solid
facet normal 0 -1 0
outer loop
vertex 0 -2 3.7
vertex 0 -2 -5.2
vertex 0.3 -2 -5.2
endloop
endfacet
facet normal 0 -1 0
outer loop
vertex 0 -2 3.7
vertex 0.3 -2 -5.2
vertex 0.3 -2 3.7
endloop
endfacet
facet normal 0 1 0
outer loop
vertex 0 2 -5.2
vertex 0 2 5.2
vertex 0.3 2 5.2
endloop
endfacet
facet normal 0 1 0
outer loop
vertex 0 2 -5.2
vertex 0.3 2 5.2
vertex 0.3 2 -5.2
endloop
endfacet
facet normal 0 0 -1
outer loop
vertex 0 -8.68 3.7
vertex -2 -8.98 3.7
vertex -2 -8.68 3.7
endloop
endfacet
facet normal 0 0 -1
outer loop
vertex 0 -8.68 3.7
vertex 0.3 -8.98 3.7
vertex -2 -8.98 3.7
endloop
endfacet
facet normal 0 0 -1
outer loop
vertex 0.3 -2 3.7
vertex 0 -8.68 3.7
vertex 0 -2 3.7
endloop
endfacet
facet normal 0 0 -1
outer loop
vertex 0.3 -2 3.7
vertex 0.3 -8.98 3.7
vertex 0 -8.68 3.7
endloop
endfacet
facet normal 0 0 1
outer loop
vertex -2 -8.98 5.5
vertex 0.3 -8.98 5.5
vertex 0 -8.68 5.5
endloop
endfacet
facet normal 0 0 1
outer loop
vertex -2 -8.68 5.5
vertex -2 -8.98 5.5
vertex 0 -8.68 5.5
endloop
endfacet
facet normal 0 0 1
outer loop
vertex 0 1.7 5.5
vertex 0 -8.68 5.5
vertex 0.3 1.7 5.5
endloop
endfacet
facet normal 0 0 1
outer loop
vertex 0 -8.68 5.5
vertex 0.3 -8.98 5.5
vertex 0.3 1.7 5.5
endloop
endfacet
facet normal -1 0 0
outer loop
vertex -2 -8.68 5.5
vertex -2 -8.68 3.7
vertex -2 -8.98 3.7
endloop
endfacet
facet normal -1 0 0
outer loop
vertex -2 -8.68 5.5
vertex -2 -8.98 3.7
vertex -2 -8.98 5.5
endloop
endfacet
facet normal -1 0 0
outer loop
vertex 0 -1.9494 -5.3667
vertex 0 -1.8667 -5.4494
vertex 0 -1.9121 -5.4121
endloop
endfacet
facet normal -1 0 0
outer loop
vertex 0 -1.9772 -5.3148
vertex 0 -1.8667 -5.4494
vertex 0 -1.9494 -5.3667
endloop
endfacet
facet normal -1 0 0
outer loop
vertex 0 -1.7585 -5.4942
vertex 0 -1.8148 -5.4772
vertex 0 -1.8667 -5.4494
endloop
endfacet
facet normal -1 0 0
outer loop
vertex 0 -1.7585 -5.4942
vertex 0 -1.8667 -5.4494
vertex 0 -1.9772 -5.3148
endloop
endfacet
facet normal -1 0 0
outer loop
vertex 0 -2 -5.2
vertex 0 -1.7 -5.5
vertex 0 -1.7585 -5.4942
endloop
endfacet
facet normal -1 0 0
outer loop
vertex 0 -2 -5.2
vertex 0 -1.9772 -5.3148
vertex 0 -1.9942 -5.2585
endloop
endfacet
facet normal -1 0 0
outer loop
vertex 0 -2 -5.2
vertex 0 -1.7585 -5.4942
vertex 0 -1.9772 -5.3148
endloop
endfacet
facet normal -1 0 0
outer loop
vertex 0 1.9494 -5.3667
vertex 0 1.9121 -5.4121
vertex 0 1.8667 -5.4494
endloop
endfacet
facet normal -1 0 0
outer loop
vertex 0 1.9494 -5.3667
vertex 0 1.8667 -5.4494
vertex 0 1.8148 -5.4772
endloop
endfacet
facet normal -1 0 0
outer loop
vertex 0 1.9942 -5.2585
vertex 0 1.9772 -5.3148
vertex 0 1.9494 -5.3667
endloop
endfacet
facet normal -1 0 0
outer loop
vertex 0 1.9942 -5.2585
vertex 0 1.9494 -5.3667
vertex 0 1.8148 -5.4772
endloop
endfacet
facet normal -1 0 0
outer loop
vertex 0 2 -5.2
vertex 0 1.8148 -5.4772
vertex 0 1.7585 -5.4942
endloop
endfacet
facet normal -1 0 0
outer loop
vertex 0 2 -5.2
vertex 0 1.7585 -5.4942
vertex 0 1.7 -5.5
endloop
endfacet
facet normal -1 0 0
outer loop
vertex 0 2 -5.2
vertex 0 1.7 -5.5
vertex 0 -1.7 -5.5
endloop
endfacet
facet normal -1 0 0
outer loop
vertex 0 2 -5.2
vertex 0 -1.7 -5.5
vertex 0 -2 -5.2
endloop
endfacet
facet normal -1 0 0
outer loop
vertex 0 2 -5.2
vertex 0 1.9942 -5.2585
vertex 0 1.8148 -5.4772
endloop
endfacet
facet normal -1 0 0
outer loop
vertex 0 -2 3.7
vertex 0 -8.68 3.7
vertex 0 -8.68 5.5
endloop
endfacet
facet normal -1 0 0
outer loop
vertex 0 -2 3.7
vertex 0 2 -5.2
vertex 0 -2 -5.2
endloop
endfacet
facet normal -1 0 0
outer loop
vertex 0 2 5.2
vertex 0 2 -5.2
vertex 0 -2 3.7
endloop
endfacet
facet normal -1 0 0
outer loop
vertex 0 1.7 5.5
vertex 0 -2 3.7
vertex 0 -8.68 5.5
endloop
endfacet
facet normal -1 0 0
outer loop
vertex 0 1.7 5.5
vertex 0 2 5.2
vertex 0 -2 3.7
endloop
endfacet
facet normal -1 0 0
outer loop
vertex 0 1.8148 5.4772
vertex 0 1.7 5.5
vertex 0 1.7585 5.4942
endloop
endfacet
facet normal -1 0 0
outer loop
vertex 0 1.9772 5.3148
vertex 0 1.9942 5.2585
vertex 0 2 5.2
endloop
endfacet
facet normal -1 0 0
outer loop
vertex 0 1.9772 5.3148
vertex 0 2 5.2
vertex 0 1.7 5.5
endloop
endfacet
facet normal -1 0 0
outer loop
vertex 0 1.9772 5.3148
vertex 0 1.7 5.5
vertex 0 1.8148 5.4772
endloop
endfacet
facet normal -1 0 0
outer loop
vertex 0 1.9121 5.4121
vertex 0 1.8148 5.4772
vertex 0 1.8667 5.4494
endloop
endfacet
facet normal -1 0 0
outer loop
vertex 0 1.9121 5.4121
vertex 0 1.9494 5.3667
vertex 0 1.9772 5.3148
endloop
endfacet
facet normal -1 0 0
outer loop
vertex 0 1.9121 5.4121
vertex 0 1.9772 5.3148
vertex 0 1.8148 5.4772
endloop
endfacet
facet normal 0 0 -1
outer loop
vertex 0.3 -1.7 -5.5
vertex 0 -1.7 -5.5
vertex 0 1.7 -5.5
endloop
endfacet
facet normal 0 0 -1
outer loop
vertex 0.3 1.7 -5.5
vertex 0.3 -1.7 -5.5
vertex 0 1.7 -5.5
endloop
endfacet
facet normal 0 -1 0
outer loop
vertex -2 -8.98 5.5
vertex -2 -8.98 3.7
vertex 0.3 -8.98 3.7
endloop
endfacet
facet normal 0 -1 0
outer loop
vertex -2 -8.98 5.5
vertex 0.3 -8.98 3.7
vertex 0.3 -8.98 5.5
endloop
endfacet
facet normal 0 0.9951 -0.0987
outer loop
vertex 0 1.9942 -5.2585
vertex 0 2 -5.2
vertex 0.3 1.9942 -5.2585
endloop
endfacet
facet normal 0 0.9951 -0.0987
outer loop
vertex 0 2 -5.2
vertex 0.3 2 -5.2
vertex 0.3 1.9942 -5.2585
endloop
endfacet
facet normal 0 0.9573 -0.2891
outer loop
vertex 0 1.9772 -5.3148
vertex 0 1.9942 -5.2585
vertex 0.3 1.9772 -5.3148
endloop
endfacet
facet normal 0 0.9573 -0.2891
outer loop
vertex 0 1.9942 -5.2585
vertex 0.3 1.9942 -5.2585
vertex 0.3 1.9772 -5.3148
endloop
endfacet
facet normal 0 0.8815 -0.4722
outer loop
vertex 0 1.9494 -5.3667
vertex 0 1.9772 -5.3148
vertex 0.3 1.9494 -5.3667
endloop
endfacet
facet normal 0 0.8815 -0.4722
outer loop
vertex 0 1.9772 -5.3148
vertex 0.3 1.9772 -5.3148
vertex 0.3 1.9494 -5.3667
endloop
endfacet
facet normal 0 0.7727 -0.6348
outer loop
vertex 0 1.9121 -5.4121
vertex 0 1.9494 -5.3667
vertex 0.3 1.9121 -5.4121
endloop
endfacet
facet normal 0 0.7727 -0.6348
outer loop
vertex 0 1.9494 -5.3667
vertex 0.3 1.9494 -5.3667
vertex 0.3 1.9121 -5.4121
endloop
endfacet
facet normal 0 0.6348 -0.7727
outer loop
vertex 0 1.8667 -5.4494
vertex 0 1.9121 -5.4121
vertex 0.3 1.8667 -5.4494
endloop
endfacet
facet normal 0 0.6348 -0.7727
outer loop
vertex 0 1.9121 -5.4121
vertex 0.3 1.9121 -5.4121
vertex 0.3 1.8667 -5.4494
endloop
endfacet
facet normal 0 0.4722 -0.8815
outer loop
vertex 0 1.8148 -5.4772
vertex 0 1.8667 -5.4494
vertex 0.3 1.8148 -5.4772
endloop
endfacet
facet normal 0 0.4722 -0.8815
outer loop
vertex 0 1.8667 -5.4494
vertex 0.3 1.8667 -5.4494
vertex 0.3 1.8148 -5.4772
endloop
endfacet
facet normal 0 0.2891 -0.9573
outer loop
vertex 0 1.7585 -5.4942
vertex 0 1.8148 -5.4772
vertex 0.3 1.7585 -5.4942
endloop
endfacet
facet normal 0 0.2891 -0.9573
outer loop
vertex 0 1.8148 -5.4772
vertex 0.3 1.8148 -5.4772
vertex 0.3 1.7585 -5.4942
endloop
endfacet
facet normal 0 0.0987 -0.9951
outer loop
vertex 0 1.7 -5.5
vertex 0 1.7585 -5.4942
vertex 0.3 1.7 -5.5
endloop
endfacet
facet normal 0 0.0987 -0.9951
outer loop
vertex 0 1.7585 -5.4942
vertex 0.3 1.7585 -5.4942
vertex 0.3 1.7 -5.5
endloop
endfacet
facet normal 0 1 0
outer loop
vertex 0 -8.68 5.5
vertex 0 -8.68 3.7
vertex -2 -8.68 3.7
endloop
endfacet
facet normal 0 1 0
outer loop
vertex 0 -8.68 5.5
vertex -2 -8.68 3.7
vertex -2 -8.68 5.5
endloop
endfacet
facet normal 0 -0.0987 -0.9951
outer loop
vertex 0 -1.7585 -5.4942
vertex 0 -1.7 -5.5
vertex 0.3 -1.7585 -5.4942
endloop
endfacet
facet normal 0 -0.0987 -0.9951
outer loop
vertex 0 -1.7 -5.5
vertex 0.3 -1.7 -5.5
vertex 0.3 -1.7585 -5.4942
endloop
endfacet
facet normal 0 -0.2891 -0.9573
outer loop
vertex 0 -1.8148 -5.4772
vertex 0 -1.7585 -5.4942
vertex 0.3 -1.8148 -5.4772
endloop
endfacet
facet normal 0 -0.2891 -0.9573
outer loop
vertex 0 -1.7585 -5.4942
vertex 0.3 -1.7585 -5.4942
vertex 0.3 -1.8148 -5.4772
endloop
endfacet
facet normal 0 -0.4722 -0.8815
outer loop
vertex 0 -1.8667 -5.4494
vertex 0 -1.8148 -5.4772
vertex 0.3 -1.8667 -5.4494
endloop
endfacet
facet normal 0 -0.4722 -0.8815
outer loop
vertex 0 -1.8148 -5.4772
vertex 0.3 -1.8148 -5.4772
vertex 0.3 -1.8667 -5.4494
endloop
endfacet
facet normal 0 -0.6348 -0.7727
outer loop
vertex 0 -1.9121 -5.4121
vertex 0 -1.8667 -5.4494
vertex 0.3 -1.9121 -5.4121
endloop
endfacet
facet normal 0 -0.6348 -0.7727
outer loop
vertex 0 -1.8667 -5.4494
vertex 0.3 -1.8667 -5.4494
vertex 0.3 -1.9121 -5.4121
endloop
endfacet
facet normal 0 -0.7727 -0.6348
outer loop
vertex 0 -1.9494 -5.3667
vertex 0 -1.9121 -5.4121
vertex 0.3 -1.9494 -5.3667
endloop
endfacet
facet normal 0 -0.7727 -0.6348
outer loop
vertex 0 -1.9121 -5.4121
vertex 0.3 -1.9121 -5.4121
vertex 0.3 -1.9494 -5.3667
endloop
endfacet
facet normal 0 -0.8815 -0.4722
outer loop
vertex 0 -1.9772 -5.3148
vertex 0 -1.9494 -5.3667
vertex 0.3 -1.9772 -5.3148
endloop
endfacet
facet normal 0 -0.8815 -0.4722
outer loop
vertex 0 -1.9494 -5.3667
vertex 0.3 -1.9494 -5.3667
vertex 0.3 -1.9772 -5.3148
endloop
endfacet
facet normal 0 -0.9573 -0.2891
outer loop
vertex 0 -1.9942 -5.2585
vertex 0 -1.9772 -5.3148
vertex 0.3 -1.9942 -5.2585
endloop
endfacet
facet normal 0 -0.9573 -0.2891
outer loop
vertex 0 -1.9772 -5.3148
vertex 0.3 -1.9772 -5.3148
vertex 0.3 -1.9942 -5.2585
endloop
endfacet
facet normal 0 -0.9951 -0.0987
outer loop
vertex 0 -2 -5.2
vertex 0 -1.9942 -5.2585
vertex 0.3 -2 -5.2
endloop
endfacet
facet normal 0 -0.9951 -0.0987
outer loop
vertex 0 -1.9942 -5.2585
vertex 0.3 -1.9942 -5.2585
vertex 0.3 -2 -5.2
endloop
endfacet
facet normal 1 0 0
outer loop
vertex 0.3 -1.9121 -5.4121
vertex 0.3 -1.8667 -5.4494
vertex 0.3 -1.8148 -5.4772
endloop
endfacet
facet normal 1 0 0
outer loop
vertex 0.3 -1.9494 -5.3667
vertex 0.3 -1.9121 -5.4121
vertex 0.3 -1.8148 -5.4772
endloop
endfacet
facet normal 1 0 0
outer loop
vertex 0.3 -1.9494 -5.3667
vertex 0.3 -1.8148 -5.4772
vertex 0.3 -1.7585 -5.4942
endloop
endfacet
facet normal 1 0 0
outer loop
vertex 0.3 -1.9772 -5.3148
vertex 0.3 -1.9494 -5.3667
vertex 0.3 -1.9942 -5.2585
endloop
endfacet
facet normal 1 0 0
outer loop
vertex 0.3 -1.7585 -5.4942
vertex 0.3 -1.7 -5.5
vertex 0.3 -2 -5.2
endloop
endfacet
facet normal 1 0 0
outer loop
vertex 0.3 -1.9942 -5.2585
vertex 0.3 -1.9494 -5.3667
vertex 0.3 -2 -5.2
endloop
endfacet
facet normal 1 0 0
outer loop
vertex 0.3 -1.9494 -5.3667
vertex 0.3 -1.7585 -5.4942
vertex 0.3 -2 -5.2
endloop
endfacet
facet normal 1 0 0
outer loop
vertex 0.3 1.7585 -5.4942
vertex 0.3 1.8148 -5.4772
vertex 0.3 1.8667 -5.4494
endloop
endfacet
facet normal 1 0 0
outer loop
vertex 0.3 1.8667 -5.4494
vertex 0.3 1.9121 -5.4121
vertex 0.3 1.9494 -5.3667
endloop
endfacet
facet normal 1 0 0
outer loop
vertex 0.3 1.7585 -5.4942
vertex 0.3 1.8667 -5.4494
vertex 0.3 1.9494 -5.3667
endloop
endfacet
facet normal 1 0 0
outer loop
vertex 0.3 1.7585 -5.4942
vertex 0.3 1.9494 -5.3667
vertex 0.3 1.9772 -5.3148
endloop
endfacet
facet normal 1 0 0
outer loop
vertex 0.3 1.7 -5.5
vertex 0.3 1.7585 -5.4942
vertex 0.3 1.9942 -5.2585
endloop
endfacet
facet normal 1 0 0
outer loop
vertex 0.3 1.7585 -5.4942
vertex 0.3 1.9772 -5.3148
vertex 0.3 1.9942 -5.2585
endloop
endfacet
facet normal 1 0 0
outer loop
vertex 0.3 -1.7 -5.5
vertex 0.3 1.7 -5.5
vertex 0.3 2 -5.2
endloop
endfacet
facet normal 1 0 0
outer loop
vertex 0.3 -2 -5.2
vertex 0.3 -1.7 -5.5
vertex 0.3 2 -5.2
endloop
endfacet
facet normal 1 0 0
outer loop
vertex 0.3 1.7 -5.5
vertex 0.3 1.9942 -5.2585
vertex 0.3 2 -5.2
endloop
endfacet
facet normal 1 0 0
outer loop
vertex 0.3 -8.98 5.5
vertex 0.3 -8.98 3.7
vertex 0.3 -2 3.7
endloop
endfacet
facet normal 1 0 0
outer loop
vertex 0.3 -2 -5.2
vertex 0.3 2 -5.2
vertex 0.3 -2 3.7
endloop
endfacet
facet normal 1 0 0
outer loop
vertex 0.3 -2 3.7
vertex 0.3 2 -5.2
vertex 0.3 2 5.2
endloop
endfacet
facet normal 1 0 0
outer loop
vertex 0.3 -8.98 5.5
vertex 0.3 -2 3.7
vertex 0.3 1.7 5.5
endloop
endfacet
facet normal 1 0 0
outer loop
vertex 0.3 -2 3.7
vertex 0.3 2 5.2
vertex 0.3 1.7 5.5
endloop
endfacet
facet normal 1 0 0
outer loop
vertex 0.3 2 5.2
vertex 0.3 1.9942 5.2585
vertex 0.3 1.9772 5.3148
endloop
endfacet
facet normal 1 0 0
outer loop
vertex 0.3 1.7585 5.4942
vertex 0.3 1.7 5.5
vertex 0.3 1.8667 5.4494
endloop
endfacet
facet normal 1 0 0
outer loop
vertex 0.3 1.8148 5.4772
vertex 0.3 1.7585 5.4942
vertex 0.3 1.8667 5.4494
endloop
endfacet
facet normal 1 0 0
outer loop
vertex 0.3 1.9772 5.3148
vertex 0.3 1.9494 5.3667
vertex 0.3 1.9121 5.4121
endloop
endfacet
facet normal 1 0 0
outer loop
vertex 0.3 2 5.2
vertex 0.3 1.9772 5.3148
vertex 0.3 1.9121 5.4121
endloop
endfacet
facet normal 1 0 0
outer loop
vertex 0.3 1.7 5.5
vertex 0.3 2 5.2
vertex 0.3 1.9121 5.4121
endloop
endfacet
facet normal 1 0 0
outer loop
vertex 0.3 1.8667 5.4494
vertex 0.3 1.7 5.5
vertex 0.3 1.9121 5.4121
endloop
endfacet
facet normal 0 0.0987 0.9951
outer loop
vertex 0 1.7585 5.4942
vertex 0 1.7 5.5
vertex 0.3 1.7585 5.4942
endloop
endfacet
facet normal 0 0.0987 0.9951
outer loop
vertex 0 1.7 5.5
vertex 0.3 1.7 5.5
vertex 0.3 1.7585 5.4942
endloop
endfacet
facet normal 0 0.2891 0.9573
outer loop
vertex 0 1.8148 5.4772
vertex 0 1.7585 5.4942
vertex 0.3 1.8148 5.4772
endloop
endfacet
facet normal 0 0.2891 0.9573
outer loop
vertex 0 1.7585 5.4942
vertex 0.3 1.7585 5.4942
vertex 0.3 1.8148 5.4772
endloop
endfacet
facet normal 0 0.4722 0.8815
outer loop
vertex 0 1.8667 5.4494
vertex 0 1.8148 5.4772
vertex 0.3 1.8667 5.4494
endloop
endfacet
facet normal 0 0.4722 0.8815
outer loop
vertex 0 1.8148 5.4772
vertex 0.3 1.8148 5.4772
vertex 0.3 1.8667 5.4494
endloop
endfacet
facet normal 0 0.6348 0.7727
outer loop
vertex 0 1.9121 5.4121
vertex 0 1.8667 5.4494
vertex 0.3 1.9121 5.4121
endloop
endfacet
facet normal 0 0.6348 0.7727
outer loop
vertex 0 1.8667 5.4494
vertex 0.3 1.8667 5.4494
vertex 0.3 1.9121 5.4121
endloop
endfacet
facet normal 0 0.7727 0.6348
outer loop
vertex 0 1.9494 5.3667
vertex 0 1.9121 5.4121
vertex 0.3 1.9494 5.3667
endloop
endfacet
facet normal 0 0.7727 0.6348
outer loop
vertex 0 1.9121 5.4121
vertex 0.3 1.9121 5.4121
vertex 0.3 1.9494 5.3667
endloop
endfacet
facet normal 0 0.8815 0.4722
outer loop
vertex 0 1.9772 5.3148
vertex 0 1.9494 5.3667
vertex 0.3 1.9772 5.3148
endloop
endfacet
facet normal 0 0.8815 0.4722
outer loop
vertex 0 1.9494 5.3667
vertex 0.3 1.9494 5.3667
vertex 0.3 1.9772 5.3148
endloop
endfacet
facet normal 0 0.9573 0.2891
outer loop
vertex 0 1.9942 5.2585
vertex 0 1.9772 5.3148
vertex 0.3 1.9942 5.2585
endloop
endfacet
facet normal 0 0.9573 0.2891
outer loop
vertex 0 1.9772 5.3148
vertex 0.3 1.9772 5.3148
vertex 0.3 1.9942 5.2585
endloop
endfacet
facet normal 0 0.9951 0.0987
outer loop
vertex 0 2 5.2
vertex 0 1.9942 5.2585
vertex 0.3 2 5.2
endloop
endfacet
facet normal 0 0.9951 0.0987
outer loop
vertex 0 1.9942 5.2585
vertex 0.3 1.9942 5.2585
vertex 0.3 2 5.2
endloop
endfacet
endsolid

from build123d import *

# Parameters (mm, degrees)
EXTRUDE_1_DEPTH = 0.3
SKETCH_3_W      = 1.8
SKETCH_3_H      = 0.3
EXTRUDE_2_DEPTH = 2
FILLET_1_R      = 0.3


with BuildPart() as part:
    # 草图1 → 凸台-拉伸1 (new body)
    with BuildSketch(Plane(origin=(0, 0, 0), x_dir=(0, 0, -1), z_dir=(1, 0, 0))):
        Polygon((-5.5, -2), (-5.5, -1.5), (-5.5, -0.5), (-5.5, 0.5), (-5.5, 1.5), (-5.5, 2), (5.5, 2), (5.5, 1.5), (5.5, 0.5), (5.5, -0.5), (5.5, -1.5), (5.5, -2), (-3.7, -2), (-3.7, -8.98), (-5.5, -8.98), align=None)
    extrude(amount=EXTRUDE_1_DEPTH)

    # 草图3 → 凸台-拉伸2 (add)
    with BuildSketch(Plane.ZY):
        with Locations((4.6, -8.83)):
            Rectangle(SKETCH_3_W, SKETCH_3_H)
    extrude(amount=EXTRUDE_2_DEPTH)

    # 圆角1
    fillet_1_edges = [part.edges().sort_by_distance(p)[0] for p in [
        (0.15, -2, -5.5),
        (0.15, 2, 5.5),
        (0.15, 2, -5.5),
    ]]
    fillet(fillet_1_edges, radius=FILLET_1_R)


solid = part.part
